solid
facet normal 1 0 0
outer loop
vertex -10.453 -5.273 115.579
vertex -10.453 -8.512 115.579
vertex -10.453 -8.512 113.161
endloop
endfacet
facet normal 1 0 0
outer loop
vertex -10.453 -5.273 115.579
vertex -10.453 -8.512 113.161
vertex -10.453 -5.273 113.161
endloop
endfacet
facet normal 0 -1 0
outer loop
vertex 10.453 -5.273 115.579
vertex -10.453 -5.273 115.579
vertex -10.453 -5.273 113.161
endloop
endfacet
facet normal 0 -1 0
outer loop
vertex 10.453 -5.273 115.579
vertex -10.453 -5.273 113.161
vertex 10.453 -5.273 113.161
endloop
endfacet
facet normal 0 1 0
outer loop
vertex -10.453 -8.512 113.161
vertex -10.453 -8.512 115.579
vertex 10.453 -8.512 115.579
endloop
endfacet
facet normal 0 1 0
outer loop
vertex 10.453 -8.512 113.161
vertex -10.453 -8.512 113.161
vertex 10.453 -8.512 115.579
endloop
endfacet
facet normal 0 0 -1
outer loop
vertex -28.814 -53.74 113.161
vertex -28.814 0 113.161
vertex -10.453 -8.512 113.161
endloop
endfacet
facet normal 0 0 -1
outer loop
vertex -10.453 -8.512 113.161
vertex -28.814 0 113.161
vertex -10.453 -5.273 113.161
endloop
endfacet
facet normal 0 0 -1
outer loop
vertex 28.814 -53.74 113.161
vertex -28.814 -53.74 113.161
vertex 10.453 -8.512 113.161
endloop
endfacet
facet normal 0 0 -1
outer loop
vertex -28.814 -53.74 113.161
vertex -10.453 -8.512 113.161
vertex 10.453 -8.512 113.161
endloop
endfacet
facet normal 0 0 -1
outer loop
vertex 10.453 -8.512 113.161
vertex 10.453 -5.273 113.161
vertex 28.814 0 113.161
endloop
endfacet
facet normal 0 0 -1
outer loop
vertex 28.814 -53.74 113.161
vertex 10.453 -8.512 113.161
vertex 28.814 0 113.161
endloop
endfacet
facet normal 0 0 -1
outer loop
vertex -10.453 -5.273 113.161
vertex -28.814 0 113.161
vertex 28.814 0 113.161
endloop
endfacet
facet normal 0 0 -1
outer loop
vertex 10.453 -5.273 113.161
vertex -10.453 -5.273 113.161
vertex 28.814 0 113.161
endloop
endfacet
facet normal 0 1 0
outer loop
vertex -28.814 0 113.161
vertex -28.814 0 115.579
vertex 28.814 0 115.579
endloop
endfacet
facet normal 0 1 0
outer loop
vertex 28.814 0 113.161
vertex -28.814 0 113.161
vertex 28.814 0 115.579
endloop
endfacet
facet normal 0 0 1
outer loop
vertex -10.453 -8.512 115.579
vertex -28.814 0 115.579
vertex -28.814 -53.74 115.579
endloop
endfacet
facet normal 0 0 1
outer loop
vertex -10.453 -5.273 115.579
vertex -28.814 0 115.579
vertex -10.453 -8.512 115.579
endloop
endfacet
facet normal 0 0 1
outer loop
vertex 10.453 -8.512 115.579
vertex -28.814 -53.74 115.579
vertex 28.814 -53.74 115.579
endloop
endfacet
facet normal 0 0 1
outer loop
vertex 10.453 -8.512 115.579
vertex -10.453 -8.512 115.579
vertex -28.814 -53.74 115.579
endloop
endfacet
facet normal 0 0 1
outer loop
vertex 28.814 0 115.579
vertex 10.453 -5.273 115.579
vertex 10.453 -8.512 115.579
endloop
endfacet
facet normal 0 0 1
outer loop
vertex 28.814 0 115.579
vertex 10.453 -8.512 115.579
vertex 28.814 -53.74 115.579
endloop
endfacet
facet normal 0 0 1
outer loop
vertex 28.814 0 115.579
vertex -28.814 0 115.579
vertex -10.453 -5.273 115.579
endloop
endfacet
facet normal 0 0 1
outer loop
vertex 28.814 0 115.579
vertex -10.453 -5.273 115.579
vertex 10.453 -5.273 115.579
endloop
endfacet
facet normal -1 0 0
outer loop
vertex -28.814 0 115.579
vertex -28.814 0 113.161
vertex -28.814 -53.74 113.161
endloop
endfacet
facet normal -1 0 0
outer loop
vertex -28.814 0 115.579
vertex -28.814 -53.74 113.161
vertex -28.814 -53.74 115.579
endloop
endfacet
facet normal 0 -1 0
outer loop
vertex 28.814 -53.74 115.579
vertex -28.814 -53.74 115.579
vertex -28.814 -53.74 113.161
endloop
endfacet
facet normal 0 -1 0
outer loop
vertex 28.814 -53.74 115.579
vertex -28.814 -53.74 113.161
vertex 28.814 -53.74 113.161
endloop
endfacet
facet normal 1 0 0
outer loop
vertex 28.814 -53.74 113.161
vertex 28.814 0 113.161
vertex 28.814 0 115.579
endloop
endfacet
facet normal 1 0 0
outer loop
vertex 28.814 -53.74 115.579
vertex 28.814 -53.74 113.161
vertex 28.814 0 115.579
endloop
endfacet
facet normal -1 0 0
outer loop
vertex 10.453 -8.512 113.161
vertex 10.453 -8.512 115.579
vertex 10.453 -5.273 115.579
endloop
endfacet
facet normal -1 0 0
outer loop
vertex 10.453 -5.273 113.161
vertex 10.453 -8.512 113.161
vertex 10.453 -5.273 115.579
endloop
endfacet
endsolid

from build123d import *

# Parameters (mm, degrees)
F1_W     = 57.62729
F1_H     = 2.417922
F2_DEPTH = 53.739645
F3_W     = 20.9051
F3_H     = 3.238531
F4_DEPTH = 25
F5_W     = 39.400994
F5_H     = 8.231058
F6_DEPTH = 25


with BuildPart() as f2:
    # F1 (on face) → F2 (new body)
    with BuildSketch(Plane.XZ):
        with Locations((0, 114.370458)):
            Rectangle(F1_W, F1_H)
    extrude(amount=F2_DEPTH)

    # F3 (on face) → F4 (cut)
    with BuildSketch(Plane.XY.offset(115.579419)):
        with Locations((0, -6.892247)):
            Rectangle(F3_W, F3_H)
    extrude(amount=-F4_DEPTH, mode=Mode.SUBTRACT)

    # F5 (on face) → F6 (cut)
    with BuildSketch(Plane.XZ):
        with Locations((0, -5.288288)):
            Rectangle(F5_W, F5_H)
    extrude(amount=F6_DEPTH, mode=Mode.SUBTRACT)


solid = f2.part
